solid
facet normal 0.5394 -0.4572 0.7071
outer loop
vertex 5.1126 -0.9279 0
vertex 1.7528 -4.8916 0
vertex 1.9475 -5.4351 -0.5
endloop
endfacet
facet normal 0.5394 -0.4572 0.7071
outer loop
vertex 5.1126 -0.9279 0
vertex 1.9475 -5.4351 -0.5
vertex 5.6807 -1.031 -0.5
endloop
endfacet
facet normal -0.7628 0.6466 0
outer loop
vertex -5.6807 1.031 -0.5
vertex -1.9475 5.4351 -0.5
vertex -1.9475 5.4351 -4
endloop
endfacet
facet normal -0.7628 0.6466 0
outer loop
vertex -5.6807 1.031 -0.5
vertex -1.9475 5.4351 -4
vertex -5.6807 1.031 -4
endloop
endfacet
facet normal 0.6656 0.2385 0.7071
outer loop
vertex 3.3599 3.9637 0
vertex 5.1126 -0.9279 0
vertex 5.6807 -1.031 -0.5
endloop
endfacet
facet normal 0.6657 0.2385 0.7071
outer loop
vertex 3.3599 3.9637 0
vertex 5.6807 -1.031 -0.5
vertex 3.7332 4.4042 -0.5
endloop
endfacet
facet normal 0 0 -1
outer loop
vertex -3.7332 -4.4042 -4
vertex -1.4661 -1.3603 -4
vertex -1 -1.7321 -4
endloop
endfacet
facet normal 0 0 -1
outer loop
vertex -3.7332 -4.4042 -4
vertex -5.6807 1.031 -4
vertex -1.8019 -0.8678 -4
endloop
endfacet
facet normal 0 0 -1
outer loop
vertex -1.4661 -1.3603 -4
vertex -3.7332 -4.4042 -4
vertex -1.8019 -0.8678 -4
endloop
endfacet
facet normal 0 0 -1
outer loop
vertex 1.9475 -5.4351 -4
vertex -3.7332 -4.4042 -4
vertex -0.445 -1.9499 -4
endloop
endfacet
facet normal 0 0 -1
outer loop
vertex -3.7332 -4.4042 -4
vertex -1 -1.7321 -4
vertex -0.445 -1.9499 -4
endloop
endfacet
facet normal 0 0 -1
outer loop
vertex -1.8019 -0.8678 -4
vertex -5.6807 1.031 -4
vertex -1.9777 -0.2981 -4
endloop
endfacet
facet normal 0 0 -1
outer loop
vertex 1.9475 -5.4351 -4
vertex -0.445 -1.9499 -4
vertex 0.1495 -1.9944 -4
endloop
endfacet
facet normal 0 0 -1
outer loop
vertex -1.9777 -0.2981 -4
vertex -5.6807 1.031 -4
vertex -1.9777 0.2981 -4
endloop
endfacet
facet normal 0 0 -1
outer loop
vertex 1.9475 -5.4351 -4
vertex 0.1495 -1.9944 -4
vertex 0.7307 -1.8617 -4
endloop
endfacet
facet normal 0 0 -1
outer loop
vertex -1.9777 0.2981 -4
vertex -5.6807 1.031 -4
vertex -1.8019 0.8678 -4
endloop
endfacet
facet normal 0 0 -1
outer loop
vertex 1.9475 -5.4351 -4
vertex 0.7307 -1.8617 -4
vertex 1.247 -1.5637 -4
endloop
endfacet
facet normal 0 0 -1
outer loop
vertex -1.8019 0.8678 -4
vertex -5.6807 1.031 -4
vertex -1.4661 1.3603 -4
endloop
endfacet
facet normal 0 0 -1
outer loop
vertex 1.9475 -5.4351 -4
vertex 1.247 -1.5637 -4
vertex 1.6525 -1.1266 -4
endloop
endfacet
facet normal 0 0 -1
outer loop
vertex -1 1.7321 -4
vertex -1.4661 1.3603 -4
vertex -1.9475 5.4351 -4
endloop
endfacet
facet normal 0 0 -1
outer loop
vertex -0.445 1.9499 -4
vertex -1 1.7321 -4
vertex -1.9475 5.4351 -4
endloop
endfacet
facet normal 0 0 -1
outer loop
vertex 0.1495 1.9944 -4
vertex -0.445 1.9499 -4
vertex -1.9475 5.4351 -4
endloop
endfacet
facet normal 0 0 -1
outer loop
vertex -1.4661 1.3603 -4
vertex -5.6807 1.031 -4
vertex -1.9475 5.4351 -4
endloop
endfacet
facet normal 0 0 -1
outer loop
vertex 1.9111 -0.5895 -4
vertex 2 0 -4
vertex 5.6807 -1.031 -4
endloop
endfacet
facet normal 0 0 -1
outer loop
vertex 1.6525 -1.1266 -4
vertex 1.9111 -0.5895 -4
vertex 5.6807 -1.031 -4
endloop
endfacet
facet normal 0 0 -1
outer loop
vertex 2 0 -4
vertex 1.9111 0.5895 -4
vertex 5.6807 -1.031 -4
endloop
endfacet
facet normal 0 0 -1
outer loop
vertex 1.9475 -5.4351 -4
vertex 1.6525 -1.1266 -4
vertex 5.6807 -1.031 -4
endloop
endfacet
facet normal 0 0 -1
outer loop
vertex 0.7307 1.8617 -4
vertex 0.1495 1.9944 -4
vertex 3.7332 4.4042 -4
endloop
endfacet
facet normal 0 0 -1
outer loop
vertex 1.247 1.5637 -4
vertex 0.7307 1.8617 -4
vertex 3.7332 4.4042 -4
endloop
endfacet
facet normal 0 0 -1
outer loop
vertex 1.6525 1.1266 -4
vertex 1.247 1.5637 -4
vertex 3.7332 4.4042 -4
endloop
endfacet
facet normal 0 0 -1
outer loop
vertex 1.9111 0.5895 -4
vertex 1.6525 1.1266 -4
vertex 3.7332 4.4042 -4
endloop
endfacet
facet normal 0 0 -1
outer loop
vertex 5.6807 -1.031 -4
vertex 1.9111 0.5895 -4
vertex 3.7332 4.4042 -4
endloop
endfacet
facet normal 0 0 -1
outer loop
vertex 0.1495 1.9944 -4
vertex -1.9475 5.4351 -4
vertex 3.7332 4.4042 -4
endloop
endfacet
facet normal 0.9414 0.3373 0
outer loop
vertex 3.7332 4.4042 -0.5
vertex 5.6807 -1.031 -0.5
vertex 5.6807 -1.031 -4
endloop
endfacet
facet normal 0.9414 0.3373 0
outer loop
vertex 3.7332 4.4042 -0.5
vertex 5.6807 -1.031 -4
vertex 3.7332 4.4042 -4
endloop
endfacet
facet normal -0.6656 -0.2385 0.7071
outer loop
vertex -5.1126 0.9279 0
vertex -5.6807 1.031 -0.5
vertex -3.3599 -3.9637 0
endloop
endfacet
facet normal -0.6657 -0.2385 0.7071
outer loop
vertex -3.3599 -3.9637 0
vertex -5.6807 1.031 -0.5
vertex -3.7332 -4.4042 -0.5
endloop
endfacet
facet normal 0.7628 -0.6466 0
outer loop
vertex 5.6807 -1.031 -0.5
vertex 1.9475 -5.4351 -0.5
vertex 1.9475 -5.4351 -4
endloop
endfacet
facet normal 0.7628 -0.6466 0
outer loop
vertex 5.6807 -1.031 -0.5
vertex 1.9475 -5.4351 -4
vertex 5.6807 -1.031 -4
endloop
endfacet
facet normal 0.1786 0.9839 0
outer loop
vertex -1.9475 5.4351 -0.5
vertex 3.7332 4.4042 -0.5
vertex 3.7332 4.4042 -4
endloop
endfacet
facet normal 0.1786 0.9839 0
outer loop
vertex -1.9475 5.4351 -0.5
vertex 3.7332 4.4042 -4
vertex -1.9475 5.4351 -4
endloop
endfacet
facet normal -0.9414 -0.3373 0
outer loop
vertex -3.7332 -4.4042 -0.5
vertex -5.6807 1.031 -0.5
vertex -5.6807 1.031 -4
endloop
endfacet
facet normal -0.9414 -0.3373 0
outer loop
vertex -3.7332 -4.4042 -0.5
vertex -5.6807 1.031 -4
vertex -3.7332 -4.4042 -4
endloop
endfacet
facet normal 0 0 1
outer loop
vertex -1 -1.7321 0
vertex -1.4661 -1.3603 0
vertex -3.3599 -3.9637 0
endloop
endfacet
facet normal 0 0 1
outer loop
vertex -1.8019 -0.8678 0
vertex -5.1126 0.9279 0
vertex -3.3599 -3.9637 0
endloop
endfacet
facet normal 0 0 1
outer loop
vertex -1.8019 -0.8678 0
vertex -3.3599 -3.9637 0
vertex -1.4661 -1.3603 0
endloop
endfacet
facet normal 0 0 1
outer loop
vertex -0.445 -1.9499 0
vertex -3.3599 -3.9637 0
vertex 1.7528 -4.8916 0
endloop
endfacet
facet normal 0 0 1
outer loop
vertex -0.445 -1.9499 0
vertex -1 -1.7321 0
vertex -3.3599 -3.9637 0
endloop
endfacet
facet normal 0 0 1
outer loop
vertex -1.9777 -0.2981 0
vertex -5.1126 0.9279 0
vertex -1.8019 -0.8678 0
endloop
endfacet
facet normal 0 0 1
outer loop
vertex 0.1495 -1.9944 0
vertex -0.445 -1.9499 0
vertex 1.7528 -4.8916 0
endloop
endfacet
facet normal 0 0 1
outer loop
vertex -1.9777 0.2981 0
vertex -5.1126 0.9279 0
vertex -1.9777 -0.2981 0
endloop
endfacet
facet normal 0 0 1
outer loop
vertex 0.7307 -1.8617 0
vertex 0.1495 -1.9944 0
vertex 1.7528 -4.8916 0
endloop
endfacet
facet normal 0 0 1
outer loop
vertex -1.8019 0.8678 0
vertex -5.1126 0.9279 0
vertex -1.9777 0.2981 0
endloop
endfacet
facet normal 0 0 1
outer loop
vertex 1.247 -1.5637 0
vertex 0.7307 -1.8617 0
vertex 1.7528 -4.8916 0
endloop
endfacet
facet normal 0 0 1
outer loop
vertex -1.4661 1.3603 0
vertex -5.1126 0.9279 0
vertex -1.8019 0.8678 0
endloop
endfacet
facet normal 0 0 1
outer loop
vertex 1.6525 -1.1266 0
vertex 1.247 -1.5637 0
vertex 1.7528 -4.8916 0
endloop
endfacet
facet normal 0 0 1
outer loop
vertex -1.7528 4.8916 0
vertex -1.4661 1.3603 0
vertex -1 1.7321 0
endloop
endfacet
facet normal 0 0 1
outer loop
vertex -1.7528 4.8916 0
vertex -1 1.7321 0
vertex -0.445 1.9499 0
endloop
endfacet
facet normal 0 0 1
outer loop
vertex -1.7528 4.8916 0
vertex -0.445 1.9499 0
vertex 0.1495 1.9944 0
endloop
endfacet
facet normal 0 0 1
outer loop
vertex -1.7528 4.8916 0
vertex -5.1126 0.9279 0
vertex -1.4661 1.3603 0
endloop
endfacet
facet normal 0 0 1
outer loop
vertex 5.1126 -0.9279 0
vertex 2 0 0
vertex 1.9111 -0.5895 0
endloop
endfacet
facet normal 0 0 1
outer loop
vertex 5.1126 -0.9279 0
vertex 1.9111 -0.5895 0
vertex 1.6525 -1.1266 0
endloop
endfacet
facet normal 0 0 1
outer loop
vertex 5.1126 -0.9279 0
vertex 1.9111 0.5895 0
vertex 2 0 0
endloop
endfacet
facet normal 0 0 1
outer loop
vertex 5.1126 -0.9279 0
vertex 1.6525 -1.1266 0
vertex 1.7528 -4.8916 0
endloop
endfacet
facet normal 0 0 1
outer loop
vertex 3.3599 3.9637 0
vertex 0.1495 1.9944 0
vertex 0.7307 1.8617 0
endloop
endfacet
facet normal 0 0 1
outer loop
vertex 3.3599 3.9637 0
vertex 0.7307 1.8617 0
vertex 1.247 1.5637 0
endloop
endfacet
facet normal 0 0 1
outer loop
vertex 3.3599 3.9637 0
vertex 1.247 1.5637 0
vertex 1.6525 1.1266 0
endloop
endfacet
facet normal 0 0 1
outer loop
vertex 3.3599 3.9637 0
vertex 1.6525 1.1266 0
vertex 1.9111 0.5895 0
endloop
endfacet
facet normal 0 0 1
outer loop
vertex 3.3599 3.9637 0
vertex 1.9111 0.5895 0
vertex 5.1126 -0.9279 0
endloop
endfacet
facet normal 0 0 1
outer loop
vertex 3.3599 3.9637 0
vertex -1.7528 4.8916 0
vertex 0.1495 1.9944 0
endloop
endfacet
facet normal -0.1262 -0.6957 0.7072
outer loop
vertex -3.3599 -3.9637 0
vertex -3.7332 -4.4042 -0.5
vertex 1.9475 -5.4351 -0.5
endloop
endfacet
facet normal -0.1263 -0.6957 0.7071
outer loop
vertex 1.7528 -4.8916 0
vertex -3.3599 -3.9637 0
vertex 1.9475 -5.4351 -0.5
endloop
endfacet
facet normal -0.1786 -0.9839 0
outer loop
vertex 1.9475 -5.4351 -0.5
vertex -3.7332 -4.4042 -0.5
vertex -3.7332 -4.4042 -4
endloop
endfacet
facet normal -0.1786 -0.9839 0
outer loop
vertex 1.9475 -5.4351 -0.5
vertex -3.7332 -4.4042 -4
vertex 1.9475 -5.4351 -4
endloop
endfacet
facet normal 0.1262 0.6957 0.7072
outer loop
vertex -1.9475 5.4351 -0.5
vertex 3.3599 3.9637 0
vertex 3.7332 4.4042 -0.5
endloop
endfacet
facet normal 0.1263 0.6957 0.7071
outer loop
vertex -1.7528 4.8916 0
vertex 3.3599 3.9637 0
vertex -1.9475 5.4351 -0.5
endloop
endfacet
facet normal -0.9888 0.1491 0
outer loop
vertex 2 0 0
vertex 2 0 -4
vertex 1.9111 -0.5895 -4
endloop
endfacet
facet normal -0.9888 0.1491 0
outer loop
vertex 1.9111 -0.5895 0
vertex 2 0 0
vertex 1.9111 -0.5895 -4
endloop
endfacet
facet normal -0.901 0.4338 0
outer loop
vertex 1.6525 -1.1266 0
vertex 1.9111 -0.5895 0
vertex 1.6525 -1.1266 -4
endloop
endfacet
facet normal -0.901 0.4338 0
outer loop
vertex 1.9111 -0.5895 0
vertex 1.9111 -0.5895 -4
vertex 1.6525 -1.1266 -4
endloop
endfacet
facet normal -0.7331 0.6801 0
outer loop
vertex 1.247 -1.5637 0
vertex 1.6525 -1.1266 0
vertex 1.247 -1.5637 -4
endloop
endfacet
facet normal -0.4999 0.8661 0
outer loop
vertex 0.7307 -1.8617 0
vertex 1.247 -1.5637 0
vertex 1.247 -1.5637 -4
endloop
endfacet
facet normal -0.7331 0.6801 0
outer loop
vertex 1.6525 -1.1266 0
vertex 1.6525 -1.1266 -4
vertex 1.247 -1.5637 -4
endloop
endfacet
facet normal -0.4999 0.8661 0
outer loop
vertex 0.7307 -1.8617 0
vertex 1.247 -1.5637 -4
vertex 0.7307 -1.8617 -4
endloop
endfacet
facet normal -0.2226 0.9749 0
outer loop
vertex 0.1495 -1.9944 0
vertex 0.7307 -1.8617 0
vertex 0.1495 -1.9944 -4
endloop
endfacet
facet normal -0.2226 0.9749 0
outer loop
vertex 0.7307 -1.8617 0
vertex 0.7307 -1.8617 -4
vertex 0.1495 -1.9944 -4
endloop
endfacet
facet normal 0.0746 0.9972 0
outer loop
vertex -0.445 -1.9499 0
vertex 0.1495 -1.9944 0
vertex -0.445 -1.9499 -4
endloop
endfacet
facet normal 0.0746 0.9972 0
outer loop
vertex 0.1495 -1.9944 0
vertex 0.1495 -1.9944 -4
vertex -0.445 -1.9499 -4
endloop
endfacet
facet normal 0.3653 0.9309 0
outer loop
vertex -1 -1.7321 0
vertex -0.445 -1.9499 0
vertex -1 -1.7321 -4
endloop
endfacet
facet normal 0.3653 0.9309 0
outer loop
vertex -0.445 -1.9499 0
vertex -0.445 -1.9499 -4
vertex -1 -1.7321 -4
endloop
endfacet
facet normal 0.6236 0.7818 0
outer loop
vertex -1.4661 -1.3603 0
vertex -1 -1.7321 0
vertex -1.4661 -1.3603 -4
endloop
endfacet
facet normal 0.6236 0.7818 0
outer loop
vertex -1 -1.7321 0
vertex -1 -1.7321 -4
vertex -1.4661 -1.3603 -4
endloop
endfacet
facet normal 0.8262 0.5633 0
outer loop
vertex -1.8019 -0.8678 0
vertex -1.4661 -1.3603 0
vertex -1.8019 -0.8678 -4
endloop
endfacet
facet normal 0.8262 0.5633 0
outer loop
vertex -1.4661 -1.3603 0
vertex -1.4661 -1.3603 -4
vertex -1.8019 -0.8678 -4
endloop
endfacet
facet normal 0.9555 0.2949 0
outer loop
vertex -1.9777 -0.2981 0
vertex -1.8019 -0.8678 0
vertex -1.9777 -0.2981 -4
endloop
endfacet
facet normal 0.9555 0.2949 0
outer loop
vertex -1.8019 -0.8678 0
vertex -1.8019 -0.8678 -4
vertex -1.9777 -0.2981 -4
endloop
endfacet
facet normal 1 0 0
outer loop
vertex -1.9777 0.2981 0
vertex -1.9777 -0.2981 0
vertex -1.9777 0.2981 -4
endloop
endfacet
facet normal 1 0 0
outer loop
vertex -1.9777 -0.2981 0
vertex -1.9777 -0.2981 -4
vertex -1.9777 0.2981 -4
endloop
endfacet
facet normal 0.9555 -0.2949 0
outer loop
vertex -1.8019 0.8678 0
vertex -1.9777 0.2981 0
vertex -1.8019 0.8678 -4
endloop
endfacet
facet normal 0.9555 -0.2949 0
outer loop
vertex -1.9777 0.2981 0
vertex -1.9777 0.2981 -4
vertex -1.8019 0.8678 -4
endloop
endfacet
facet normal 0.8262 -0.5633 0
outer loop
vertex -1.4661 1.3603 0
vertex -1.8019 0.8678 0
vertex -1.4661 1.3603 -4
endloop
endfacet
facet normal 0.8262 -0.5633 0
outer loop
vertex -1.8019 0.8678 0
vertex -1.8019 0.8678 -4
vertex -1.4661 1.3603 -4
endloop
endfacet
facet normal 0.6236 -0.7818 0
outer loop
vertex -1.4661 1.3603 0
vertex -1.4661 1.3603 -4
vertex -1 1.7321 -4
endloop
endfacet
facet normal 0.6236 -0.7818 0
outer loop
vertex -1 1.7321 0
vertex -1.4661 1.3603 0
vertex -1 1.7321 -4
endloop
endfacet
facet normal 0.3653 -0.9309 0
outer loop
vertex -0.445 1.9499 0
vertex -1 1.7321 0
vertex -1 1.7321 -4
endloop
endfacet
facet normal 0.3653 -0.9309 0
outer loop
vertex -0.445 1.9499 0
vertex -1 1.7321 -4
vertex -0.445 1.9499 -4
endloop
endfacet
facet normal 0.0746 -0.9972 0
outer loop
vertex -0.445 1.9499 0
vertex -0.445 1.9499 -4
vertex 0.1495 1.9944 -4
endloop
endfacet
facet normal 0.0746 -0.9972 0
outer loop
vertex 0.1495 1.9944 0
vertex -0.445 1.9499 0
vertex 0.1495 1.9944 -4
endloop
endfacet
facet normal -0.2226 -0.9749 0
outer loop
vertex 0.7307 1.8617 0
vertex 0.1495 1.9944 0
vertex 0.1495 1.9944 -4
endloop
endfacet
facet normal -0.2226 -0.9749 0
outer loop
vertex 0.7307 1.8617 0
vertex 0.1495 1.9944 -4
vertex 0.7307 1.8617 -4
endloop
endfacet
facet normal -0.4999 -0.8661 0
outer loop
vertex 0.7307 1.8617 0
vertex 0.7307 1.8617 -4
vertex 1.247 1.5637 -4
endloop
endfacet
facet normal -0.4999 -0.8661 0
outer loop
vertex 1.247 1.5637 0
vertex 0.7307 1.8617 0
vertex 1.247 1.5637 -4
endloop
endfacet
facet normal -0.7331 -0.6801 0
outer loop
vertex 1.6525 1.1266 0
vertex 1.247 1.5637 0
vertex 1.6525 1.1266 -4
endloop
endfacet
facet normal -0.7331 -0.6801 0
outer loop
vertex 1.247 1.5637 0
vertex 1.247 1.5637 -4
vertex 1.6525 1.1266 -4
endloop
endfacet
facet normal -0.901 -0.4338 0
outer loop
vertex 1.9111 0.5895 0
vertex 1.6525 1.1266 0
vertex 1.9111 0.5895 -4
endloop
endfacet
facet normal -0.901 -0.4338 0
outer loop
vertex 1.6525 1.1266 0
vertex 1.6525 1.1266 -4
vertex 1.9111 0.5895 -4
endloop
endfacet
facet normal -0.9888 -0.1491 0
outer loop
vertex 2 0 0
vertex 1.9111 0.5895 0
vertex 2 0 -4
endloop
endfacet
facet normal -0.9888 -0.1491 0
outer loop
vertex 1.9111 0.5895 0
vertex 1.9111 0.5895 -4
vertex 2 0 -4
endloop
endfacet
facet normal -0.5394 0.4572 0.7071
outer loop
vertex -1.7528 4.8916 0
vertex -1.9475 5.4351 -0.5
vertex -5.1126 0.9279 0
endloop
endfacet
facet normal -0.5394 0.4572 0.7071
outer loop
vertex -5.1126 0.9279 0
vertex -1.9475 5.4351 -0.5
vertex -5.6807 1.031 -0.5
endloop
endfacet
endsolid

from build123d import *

# Parameters (mm, degrees)
F3_DEPTH = 4
F4_R     = 2
F5_DEPTH = 4
F6_SIZE  = 0.5


# Not quite as in the source:
# - the program builds the solid bodies; features that only make, move or delete a surface that nothing else refers to are left out


with BuildPart() as f3:
    # F2 (on Top) → F3 (new body)
    with BuildSketch(Plane.XY):
        Polygon((5.6807082187, -1.0309643387), (3.7331954171, 4.4041554595), (-1.9475128016, 5.4351197982), (-5.6807082187, 1.0309643387), (-3.7331954171, -4.4041554595), (1.9475128016, -5.4351197982), align=None)
    extrude(amount=-F3_DEPTH)

    # F4 (on face) → F5 (cut)
    with BuildSketch(Plane(origin=(0, 0, -4), x_dir=(1, 0, 0), z_dir=(0, 0, -1))):
        Circle(F4_R)
    extrude(amount=-F5_DEPTH, mode=Mode.SUBTRACT)

    # F6
    f6_edges = [f3.edges().sort_by_distance(p)[0] for p in [
        (-0.892841, -4.919638, 0),
        (3.814111, -3.233042, 0),
        (4.706952, 1.686596, 0),
        (0.892841, 4.919638, 0),
        (-3.814111, 3.233042, 0),
        (-4.706952, -1.686596, 0),
    ]]
    chamfer(f6_edges, length=F6_SIZE)


solid = f3.part
